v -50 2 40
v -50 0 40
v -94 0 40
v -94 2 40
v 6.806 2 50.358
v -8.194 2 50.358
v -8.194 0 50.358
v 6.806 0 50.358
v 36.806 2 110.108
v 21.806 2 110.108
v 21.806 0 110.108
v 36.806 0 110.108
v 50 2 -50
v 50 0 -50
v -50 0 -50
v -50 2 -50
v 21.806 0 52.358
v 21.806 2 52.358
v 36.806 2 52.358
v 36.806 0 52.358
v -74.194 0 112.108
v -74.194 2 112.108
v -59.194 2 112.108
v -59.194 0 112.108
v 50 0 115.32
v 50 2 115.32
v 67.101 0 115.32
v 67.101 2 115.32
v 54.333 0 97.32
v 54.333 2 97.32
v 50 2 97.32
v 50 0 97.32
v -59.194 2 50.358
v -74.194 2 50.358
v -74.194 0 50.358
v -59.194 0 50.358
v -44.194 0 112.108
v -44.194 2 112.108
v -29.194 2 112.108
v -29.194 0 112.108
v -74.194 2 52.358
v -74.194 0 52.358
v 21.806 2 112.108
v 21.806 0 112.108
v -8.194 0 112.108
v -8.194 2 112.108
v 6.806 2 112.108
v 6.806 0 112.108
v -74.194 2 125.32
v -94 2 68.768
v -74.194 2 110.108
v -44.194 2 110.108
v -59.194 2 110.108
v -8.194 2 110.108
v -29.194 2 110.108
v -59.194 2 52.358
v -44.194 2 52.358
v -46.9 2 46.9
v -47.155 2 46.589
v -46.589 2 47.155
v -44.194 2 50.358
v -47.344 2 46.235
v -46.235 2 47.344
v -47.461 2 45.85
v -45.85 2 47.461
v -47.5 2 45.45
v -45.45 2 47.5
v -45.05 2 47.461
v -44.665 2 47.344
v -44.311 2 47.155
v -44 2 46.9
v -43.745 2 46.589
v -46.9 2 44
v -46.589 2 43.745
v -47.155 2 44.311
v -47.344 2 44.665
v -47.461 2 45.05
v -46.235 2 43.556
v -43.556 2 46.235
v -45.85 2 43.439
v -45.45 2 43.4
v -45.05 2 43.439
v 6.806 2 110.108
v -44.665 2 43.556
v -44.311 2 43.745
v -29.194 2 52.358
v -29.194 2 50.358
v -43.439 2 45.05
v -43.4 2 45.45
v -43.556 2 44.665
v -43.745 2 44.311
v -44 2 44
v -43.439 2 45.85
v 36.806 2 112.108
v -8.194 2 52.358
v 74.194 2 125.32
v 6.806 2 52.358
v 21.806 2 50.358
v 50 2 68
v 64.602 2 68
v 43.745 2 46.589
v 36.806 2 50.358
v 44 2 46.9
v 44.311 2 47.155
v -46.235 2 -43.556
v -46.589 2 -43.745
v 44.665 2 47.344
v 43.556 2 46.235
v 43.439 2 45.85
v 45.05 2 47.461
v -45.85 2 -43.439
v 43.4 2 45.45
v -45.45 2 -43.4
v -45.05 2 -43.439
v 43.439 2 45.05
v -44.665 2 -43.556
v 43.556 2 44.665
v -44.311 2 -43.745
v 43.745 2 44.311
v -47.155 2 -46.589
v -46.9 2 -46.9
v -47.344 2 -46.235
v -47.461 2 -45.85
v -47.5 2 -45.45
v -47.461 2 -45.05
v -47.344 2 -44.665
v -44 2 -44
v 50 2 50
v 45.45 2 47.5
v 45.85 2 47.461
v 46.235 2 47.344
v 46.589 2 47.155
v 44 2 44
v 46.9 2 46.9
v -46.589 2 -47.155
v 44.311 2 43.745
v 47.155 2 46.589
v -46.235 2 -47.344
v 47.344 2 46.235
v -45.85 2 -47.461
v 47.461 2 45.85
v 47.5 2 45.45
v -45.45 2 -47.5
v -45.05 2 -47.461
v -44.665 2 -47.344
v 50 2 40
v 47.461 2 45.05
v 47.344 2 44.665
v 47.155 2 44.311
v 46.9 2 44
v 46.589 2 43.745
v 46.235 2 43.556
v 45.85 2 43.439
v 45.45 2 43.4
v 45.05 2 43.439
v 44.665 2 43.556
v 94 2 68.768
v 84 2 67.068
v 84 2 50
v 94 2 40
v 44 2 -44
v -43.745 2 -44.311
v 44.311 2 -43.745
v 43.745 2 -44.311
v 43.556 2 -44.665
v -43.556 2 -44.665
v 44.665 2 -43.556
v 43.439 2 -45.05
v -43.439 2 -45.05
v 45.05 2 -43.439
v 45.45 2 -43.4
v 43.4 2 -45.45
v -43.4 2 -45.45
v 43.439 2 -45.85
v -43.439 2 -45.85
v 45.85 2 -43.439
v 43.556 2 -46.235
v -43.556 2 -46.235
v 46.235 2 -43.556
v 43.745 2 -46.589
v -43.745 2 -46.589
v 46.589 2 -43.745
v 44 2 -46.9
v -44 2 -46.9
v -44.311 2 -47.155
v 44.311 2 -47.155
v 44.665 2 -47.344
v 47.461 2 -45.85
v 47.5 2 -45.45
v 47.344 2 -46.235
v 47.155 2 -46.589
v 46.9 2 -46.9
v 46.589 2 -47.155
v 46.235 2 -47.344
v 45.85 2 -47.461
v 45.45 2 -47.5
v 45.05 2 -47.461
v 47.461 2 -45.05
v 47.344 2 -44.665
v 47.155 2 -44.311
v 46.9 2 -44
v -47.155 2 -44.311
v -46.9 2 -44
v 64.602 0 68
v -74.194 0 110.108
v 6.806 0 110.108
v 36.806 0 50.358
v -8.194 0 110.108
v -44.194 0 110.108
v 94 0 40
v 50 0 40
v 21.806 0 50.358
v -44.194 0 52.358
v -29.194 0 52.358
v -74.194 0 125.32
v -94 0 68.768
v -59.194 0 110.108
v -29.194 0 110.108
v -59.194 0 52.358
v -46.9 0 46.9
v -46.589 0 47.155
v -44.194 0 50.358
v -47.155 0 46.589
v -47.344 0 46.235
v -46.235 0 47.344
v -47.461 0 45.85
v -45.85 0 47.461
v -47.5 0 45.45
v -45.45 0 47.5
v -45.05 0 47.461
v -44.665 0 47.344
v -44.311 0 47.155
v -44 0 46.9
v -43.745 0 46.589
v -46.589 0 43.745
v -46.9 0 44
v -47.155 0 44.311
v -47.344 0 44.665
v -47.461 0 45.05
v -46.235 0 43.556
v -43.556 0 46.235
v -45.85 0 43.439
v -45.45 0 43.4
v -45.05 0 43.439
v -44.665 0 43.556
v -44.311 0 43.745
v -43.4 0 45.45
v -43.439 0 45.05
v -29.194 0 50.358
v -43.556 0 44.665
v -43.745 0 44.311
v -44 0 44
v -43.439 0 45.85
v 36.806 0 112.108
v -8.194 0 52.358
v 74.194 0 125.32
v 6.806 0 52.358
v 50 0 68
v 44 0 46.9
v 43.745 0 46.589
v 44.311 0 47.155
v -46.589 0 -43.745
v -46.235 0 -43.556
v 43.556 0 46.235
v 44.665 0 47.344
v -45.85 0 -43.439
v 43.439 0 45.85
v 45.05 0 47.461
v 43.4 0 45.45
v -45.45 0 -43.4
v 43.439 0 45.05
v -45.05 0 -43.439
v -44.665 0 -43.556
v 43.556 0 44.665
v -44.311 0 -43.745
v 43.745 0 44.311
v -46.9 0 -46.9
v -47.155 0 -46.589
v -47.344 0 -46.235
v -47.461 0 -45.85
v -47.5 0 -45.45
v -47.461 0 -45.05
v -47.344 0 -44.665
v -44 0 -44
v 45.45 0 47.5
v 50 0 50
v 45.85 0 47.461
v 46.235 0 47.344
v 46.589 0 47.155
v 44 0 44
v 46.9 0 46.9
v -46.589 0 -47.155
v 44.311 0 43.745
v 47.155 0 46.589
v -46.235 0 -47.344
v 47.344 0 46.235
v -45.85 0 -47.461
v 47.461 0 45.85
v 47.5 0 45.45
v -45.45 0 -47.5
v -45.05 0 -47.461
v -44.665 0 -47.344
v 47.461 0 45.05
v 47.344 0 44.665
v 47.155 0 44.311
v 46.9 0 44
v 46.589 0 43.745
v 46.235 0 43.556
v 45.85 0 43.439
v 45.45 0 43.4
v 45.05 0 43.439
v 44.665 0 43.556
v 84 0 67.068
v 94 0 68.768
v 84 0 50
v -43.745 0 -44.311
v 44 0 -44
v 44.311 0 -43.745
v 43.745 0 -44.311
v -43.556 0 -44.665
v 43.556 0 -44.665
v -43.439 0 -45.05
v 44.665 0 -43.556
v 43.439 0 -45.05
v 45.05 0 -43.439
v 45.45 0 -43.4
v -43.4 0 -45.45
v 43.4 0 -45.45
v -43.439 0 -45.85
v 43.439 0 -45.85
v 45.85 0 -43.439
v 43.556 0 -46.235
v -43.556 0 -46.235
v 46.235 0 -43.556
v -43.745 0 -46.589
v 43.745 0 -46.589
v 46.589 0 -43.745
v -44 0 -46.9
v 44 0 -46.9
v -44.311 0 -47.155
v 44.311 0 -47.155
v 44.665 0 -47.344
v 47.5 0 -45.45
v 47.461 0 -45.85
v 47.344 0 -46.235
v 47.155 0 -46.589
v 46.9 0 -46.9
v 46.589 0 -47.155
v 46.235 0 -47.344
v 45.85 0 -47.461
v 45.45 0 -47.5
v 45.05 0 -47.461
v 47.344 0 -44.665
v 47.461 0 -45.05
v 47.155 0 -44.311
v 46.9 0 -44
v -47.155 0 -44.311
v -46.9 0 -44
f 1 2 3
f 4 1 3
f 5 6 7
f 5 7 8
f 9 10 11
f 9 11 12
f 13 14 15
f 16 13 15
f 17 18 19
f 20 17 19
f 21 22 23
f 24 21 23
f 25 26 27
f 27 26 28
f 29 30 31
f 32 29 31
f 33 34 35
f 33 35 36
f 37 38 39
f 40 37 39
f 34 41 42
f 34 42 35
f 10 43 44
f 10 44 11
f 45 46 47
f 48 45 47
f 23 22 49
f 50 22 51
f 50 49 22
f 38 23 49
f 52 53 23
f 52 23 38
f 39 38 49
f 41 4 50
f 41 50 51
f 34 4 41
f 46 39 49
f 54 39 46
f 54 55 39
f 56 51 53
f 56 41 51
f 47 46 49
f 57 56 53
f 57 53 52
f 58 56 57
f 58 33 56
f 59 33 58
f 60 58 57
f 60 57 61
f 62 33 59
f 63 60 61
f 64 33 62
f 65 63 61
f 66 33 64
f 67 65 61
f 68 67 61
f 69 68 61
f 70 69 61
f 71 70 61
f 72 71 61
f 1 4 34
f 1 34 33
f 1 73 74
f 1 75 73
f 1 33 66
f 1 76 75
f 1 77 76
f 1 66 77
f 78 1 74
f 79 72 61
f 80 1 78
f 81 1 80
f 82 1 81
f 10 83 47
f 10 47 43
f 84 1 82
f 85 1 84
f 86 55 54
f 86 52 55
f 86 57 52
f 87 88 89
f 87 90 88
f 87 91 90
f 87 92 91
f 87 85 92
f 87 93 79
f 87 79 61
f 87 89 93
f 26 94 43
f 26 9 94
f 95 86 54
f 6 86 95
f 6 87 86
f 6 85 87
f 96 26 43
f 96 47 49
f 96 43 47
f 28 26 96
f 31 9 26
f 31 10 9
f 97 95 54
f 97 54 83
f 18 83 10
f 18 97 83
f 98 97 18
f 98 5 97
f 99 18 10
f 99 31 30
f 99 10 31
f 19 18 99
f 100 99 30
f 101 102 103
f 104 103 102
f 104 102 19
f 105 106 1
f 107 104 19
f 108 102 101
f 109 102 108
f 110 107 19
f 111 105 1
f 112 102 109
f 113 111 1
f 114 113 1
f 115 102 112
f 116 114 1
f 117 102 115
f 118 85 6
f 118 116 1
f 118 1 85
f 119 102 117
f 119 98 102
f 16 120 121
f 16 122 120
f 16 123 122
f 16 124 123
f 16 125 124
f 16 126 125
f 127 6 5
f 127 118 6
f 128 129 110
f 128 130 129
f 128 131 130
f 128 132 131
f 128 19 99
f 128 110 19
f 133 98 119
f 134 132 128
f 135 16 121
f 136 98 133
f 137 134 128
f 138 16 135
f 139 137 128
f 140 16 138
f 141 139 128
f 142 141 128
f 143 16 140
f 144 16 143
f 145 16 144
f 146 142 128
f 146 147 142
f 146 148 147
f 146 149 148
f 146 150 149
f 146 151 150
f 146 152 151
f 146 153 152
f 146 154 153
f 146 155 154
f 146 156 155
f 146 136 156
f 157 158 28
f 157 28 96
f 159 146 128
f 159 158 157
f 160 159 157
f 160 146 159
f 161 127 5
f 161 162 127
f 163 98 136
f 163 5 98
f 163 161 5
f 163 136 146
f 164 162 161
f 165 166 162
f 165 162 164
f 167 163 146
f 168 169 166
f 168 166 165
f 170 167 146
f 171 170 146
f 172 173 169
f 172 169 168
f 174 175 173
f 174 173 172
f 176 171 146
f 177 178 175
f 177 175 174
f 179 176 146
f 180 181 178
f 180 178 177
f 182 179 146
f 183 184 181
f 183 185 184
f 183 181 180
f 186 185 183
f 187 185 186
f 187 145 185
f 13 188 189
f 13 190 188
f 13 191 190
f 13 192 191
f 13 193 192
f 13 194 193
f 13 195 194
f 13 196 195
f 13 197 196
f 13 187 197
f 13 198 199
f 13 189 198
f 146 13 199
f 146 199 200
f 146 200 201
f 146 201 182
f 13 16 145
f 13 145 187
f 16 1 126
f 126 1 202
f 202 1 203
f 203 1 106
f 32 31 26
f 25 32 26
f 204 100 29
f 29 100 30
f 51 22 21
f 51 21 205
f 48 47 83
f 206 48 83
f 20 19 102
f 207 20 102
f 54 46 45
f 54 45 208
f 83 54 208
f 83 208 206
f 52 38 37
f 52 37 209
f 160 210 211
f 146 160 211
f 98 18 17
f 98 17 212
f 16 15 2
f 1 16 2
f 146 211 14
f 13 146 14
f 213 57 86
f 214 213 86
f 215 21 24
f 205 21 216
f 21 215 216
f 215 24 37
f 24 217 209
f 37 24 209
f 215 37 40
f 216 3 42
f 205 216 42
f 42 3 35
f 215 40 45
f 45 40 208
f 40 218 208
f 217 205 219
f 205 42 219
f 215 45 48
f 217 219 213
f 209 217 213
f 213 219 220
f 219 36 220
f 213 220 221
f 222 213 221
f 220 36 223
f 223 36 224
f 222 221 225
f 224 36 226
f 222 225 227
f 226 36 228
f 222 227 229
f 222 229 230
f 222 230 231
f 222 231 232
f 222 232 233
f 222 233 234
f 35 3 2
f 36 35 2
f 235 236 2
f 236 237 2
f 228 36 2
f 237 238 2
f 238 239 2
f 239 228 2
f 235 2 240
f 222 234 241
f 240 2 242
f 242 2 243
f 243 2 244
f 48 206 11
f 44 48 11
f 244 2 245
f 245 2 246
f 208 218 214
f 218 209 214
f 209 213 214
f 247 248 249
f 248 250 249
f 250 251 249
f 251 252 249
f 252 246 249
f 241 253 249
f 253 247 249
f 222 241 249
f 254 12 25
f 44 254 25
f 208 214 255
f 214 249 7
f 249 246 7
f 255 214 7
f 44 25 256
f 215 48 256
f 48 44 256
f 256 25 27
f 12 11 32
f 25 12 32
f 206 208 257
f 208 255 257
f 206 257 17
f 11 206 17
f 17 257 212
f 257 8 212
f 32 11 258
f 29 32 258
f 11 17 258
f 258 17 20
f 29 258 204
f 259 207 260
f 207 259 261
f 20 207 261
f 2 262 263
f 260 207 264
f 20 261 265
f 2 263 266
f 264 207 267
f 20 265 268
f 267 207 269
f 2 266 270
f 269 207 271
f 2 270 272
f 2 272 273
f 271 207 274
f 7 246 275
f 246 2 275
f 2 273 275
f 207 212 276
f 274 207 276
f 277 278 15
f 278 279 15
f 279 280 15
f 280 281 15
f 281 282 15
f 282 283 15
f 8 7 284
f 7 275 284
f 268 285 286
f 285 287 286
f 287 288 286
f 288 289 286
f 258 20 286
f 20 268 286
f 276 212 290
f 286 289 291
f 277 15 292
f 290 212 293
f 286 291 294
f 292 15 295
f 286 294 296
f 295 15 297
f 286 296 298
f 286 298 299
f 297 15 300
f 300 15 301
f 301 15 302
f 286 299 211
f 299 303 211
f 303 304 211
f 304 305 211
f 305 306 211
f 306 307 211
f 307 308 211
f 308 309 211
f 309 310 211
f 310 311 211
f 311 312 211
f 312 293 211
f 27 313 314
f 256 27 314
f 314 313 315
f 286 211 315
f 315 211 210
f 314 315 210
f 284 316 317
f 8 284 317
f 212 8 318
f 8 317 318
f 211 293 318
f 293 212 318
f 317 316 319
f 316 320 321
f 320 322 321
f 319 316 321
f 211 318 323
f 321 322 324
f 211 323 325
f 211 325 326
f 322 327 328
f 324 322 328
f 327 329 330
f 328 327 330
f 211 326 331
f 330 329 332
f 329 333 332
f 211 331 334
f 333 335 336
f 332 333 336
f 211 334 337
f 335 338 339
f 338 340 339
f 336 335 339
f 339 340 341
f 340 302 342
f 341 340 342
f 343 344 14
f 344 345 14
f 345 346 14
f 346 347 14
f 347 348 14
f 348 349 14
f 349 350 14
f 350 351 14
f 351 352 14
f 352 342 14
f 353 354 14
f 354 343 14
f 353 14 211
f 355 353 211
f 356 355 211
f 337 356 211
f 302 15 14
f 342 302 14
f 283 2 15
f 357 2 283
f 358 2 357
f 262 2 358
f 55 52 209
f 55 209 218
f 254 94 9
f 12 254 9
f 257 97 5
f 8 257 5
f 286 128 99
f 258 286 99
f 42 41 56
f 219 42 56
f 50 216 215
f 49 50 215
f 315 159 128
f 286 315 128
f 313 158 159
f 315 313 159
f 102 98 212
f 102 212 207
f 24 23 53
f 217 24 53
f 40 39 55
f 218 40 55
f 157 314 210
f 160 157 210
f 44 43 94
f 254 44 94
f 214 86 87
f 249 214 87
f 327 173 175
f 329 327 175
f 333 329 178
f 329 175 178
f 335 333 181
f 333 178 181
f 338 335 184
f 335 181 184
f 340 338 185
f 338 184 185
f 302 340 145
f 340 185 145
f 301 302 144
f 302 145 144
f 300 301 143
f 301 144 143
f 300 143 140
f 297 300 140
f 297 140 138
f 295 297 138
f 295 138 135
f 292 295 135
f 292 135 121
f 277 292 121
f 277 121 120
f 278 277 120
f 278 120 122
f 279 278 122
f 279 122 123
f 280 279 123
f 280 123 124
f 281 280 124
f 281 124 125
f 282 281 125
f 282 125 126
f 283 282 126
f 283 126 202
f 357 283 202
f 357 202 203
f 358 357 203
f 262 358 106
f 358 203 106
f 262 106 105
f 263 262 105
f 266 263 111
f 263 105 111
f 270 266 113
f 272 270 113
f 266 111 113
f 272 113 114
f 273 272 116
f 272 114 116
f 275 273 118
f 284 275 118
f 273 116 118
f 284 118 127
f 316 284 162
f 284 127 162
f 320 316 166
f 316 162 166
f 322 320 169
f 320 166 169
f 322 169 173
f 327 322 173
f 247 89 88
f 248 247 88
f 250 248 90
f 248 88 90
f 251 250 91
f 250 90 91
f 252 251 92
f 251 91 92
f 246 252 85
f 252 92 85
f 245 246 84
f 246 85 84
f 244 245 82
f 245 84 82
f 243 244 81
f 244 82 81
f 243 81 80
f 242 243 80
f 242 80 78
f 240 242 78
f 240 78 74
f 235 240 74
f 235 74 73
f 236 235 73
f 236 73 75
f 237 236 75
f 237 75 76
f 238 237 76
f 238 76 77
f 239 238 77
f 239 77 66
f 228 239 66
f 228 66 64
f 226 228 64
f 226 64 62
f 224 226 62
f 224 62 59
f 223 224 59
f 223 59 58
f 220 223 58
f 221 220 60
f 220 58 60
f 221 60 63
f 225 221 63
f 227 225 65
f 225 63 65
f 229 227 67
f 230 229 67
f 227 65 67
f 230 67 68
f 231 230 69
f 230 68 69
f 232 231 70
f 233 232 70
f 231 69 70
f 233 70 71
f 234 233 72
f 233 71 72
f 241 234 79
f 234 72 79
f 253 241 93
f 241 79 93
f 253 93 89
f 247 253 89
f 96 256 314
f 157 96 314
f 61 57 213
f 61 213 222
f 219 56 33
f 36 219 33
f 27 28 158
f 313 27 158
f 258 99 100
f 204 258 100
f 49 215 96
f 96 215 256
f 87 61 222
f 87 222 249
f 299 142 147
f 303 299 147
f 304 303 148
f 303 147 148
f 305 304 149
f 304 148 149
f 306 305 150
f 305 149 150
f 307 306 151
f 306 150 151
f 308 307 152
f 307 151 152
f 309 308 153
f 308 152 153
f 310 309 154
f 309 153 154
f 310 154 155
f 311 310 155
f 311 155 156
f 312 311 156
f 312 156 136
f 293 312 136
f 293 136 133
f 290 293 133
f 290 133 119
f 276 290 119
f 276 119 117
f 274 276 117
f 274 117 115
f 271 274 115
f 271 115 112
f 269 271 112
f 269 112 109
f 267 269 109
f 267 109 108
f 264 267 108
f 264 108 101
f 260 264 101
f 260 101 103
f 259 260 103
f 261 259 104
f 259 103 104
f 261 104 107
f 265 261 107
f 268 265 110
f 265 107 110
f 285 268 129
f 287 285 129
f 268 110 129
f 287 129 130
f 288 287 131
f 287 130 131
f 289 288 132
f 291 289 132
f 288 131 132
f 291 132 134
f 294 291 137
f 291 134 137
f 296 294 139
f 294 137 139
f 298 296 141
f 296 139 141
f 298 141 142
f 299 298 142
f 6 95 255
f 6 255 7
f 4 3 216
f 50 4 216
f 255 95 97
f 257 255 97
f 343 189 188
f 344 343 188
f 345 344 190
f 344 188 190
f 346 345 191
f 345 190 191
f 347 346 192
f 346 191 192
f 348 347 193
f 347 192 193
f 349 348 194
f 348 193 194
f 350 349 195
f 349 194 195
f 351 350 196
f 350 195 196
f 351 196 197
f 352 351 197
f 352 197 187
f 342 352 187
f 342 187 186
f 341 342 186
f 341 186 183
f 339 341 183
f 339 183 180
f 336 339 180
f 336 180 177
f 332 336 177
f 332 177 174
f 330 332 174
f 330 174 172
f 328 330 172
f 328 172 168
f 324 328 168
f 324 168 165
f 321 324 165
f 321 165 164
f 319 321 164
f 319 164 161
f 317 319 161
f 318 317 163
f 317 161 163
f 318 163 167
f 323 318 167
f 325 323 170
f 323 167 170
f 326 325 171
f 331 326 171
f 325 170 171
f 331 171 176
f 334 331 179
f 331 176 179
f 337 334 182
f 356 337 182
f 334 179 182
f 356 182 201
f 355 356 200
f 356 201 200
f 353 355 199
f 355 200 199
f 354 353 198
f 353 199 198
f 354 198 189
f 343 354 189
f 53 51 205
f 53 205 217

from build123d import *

# Parameters (mm, degrees)
SALIENTE_EXTRUIR1_DEPTH = 2
CROQUIS2_R              = 2.05
CORTAR_EXTRUIR1_DEPTH   = 3
CORTAR_EXTRUIR3_REACH   = 4
CORTAR_EXTRUIR4_REACH   = 4
CROQUIS5_W              = 15
CROQUIS5_H              = 2


with BuildPart() as part:
    # Croquis1 → Saliente-Extruir1 (new body)
    with BuildSketch(Plane(origin=(0, 0, 0), x_dir=(1, 0, 0), z_dir=(0, 1, 0))):
        Polygon((94, -40), (50, -40), (50, 50), (-50, 50), (-50, -40), (-94, -40), (-94, -68.768453788), (-74.193903104, -125.32), (74.193903104, -125.32), (94, -68.768453788), align=None)
    extrude(amount=SALIENTE_EXTRUIR1_DEPTH)

    # Croquis2 → Cortar-Extruir1 (cut, through all)
    with BuildSketch(Plane(origin=(0, 2, 0), x_dir=(1, 0, 0), z_dir=(0, 1, 0))):
        with Locations((-45.45, -45.45)):
            Circle(CROQUIS2_R)
        with Locations((45.45, -45.45)):
            Circle(CROQUIS2_R)
        with Locations((-45.45, 45.45)):
            Circle(CROQUIS2_R)
        with Locations((45.45, 45.45)):
            Circle(CROQUIS2_R)
    extrude(amount=-CORTAR_EXTRUIR1_DEPTH, mode=Mode.SUBTRACT)

    # Croquis4 → Cortar-Extruir3 (cut, up to next)
    with BuildSketch(Plane(origin=(0, 2, 0), x_dir=(1, 0, 0), z_dir=(0, 1, 0)), mode=Mode.PRIVATE) as cortar_extruir3_sk1:
        Polygon((50, -68), (64.601532017, -68), (54.332763081, -97.32), (50, -97.32), (50, -115.32), (67.10063881, -115.32), (84, -67.067938511), (84, -50), (50, -50), align=None)
    cortar_extruir3_tool1 = extrude(cortar_extruir3_sk1.sketch, amount=-CORTAR_EXTRUIR3_REACH, mode=Mode.PRIVATE) & part.part
    add(cortar_extruir3_tool1.solids().sort_by_distance((66.115396, 2, 78.737968))[0], mode=Mode.SUBTRACT)

    # Croquis5 → Cortar-Extruir4 (cut, up to next)
    with BuildSketch(Plane(origin=(0, 2, 0), x_dir=(1, 0, 0), z_dir=(0, 1, 0)), mode=Mode.PRIVATE) as cortar_extruir4_sk1:
        with Locations((29.306096896, -51.35767988)):
            Rectangle(CROQUIS5_W, CROQUIS5_H)
    cortar_extruir4_tool1 = extrude(cortar_extruir4_sk1.sketch, amount=-CORTAR_EXTRUIR4_REACH, mode=Mode.PRIVATE) & part.part
    add(cortar_extruir4_tool1.solids().sort_by_distance((29.306097, 2, 51.35768))[0], mode=Mode.SUBTRACT)
    # Croquis5 → Cortar-Extruir4 (cut, up to next)
    with BuildSketch(Plane(origin=(0, 2, 0), x_dir=(1, 0, 0), z_dir=(0, 1, 0)), mode=Mode.PRIVATE) as cortar_extruir4_sk2:
        with Locations((-66.693903104, -51.35767988)):
            Rectangle(CROQUIS5_W, CROQUIS5_H)
    cortar_extruir4_tool2 = extrude(cortar_extruir4_sk2.sketch, amount=-CORTAR_EXTRUIR4_REACH, mode=Mode.PRIVATE) & part.part
    add(cortar_extruir4_tool2.solids().sort_by_distance((-66.693903, 2, 51.35768))[0], mode=Mode.SUBTRACT)
    # Croquis5 → Cortar-Extruir4 (cut, up to next)
    with BuildSketch(Plane(origin=(0, 2, 0), x_dir=(1, 0, 0), z_dir=(0, 1, 0)), mode=Mode.PRIVATE) as cortar_extruir4_sk3:
        with Locations((-36.693903104, -51.35767988)):
            Rectangle(CROQUIS5_W, CROQUIS5_H)
    cortar_extruir4_tool3 = extrude(cortar_extruir4_sk3.sketch, amount=-CORTAR_EXTRUIR4_REACH, mode=Mode.PRIVATE) & part.part
    add(cortar_extruir4_tool3.solids().sort_by_distance((-36.693903, 2, 51.35768))[0], mode=Mode.SUBTRACT)
    # Croquis5 → Cortar-Extruir4 (cut, up to next)
    with BuildSketch(Plane(origin=(0, 2, 0), x_dir=(1, 0, 0), z_dir=(0, 1, 0)), mode=Mode.PRIVATE) as cortar_extruir4_sk4:
        with Locations((-0.693903104, -51.35767988)):
            Rectangle(CROQUIS5_W, CROQUIS5_H)
    cortar_extruir4_tool4 = extrude(cortar_extruir4_sk4.sketch, amount=-CORTAR_EXTRUIR4_REACH, mode=Mode.PRIVATE) & part.part
    add(cortar_extruir4_tool4.solids().sort_by_distance((-0.693903, 2, 51.35768))[0], mode=Mode.SUBTRACT)
    # Croquis5 → Cortar-Extruir4 (cut, up to next)
    with BuildSketch(Plane(origin=(0, 2, 0), x_dir=(1, 0, 0), z_dir=(0, 1, 0)), mode=Mode.PRIVATE) as cortar_extruir4_sk5:
        with Locations((-66.693903104, -111.10767988)):
            Rectangle(CROQUIS5_W, CROQUIS5_H)
    cortar_extruir4_tool5 = extrude(cortar_extruir4_sk5.sketch, amount=-CORTAR_EXTRUIR4_REACH, mode=Mode.PRIVATE) & part.part
    add(cortar_extruir4_tool5.solids().sort_by_distance((-66.693903, 2, 111.10768))[0], mode=Mode.SUBTRACT)
    # Croquis5 → Cortar-Extruir4 (cut, up to next)
    with BuildSketch(Plane(origin=(0, 2, 0), x_dir=(1, 0, 0), z_dir=(0, 1, 0)), mode=Mode.PRIVATE) as cortar_extruir4_sk6:
        with Locations((-36.693903104, -111.10767988)):
            Rectangle(CROQUIS5_W, CROQUIS5_H)
    cortar_extruir4_tool6 = extrude(cortar_extruir4_sk6.sketch, amount=-CORTAR_EXTRUIR4_REACH, mode=Mode.PRIVATE) & part.part
    add(cortar_extruir4_tool6.solids().sort_by_distance((-36.693903, 2, 111.10768))[0], mode=Mode.SUBTRACT)
    # Croquis5 → Cortar-Extruir4 (cut, up to next)
    with BuildSketch(Plane(origin=(0, 2, 0), x_dir=(1, 0, 0), z_dir=(0, 1, 0)), mode=Mode.PRIVATE) as cortar_extruir4_sk7:
        with Locations((-0.693903104, -111.10767988)):
            Rectangle(CROQUIS5_W, CROQUIS5_H)
    cortar_extruir4_tool7 = extrude(cortar_extruir4_sk7.sketch, amount=-CORTAR_EXTRUIR4_REACH, mode=Mode.PRIVATE) & part.part
    add(cortar_extruir4_tool7.solids().sort_by_distance((-0.693903, 2, 111.10768))[0], mode=Mode.SUBTRACT)
    # Croquis5 → Cortar-Extruir4 (cut, up to next)
    with BuildSketch(Plane(origin=(0, 2, 0), x_dir=(1, 0, 0), z_dir=(0, 1, 0)), mode=Mode.PRIVATE) as cortar_extruir4_sk8:
        with Locations((29.306096896, -111.10767988)):
            Rectangle(CROQUIS5_W, CROQUIS5_H)
    cortar_extruir4_tool8 = extrude(cortar_extruir4_sk8.sketch, amount=-CORTAR_EXTRUIR4_REACH, mode=Mode.PRIVATE) & part.part
    add(cortar_extruir4_tool8.solids().sort_by_distance((29.306097, 2, 111.10768))[0], mode=Mode.SUBTRACT)


solid = part.part
